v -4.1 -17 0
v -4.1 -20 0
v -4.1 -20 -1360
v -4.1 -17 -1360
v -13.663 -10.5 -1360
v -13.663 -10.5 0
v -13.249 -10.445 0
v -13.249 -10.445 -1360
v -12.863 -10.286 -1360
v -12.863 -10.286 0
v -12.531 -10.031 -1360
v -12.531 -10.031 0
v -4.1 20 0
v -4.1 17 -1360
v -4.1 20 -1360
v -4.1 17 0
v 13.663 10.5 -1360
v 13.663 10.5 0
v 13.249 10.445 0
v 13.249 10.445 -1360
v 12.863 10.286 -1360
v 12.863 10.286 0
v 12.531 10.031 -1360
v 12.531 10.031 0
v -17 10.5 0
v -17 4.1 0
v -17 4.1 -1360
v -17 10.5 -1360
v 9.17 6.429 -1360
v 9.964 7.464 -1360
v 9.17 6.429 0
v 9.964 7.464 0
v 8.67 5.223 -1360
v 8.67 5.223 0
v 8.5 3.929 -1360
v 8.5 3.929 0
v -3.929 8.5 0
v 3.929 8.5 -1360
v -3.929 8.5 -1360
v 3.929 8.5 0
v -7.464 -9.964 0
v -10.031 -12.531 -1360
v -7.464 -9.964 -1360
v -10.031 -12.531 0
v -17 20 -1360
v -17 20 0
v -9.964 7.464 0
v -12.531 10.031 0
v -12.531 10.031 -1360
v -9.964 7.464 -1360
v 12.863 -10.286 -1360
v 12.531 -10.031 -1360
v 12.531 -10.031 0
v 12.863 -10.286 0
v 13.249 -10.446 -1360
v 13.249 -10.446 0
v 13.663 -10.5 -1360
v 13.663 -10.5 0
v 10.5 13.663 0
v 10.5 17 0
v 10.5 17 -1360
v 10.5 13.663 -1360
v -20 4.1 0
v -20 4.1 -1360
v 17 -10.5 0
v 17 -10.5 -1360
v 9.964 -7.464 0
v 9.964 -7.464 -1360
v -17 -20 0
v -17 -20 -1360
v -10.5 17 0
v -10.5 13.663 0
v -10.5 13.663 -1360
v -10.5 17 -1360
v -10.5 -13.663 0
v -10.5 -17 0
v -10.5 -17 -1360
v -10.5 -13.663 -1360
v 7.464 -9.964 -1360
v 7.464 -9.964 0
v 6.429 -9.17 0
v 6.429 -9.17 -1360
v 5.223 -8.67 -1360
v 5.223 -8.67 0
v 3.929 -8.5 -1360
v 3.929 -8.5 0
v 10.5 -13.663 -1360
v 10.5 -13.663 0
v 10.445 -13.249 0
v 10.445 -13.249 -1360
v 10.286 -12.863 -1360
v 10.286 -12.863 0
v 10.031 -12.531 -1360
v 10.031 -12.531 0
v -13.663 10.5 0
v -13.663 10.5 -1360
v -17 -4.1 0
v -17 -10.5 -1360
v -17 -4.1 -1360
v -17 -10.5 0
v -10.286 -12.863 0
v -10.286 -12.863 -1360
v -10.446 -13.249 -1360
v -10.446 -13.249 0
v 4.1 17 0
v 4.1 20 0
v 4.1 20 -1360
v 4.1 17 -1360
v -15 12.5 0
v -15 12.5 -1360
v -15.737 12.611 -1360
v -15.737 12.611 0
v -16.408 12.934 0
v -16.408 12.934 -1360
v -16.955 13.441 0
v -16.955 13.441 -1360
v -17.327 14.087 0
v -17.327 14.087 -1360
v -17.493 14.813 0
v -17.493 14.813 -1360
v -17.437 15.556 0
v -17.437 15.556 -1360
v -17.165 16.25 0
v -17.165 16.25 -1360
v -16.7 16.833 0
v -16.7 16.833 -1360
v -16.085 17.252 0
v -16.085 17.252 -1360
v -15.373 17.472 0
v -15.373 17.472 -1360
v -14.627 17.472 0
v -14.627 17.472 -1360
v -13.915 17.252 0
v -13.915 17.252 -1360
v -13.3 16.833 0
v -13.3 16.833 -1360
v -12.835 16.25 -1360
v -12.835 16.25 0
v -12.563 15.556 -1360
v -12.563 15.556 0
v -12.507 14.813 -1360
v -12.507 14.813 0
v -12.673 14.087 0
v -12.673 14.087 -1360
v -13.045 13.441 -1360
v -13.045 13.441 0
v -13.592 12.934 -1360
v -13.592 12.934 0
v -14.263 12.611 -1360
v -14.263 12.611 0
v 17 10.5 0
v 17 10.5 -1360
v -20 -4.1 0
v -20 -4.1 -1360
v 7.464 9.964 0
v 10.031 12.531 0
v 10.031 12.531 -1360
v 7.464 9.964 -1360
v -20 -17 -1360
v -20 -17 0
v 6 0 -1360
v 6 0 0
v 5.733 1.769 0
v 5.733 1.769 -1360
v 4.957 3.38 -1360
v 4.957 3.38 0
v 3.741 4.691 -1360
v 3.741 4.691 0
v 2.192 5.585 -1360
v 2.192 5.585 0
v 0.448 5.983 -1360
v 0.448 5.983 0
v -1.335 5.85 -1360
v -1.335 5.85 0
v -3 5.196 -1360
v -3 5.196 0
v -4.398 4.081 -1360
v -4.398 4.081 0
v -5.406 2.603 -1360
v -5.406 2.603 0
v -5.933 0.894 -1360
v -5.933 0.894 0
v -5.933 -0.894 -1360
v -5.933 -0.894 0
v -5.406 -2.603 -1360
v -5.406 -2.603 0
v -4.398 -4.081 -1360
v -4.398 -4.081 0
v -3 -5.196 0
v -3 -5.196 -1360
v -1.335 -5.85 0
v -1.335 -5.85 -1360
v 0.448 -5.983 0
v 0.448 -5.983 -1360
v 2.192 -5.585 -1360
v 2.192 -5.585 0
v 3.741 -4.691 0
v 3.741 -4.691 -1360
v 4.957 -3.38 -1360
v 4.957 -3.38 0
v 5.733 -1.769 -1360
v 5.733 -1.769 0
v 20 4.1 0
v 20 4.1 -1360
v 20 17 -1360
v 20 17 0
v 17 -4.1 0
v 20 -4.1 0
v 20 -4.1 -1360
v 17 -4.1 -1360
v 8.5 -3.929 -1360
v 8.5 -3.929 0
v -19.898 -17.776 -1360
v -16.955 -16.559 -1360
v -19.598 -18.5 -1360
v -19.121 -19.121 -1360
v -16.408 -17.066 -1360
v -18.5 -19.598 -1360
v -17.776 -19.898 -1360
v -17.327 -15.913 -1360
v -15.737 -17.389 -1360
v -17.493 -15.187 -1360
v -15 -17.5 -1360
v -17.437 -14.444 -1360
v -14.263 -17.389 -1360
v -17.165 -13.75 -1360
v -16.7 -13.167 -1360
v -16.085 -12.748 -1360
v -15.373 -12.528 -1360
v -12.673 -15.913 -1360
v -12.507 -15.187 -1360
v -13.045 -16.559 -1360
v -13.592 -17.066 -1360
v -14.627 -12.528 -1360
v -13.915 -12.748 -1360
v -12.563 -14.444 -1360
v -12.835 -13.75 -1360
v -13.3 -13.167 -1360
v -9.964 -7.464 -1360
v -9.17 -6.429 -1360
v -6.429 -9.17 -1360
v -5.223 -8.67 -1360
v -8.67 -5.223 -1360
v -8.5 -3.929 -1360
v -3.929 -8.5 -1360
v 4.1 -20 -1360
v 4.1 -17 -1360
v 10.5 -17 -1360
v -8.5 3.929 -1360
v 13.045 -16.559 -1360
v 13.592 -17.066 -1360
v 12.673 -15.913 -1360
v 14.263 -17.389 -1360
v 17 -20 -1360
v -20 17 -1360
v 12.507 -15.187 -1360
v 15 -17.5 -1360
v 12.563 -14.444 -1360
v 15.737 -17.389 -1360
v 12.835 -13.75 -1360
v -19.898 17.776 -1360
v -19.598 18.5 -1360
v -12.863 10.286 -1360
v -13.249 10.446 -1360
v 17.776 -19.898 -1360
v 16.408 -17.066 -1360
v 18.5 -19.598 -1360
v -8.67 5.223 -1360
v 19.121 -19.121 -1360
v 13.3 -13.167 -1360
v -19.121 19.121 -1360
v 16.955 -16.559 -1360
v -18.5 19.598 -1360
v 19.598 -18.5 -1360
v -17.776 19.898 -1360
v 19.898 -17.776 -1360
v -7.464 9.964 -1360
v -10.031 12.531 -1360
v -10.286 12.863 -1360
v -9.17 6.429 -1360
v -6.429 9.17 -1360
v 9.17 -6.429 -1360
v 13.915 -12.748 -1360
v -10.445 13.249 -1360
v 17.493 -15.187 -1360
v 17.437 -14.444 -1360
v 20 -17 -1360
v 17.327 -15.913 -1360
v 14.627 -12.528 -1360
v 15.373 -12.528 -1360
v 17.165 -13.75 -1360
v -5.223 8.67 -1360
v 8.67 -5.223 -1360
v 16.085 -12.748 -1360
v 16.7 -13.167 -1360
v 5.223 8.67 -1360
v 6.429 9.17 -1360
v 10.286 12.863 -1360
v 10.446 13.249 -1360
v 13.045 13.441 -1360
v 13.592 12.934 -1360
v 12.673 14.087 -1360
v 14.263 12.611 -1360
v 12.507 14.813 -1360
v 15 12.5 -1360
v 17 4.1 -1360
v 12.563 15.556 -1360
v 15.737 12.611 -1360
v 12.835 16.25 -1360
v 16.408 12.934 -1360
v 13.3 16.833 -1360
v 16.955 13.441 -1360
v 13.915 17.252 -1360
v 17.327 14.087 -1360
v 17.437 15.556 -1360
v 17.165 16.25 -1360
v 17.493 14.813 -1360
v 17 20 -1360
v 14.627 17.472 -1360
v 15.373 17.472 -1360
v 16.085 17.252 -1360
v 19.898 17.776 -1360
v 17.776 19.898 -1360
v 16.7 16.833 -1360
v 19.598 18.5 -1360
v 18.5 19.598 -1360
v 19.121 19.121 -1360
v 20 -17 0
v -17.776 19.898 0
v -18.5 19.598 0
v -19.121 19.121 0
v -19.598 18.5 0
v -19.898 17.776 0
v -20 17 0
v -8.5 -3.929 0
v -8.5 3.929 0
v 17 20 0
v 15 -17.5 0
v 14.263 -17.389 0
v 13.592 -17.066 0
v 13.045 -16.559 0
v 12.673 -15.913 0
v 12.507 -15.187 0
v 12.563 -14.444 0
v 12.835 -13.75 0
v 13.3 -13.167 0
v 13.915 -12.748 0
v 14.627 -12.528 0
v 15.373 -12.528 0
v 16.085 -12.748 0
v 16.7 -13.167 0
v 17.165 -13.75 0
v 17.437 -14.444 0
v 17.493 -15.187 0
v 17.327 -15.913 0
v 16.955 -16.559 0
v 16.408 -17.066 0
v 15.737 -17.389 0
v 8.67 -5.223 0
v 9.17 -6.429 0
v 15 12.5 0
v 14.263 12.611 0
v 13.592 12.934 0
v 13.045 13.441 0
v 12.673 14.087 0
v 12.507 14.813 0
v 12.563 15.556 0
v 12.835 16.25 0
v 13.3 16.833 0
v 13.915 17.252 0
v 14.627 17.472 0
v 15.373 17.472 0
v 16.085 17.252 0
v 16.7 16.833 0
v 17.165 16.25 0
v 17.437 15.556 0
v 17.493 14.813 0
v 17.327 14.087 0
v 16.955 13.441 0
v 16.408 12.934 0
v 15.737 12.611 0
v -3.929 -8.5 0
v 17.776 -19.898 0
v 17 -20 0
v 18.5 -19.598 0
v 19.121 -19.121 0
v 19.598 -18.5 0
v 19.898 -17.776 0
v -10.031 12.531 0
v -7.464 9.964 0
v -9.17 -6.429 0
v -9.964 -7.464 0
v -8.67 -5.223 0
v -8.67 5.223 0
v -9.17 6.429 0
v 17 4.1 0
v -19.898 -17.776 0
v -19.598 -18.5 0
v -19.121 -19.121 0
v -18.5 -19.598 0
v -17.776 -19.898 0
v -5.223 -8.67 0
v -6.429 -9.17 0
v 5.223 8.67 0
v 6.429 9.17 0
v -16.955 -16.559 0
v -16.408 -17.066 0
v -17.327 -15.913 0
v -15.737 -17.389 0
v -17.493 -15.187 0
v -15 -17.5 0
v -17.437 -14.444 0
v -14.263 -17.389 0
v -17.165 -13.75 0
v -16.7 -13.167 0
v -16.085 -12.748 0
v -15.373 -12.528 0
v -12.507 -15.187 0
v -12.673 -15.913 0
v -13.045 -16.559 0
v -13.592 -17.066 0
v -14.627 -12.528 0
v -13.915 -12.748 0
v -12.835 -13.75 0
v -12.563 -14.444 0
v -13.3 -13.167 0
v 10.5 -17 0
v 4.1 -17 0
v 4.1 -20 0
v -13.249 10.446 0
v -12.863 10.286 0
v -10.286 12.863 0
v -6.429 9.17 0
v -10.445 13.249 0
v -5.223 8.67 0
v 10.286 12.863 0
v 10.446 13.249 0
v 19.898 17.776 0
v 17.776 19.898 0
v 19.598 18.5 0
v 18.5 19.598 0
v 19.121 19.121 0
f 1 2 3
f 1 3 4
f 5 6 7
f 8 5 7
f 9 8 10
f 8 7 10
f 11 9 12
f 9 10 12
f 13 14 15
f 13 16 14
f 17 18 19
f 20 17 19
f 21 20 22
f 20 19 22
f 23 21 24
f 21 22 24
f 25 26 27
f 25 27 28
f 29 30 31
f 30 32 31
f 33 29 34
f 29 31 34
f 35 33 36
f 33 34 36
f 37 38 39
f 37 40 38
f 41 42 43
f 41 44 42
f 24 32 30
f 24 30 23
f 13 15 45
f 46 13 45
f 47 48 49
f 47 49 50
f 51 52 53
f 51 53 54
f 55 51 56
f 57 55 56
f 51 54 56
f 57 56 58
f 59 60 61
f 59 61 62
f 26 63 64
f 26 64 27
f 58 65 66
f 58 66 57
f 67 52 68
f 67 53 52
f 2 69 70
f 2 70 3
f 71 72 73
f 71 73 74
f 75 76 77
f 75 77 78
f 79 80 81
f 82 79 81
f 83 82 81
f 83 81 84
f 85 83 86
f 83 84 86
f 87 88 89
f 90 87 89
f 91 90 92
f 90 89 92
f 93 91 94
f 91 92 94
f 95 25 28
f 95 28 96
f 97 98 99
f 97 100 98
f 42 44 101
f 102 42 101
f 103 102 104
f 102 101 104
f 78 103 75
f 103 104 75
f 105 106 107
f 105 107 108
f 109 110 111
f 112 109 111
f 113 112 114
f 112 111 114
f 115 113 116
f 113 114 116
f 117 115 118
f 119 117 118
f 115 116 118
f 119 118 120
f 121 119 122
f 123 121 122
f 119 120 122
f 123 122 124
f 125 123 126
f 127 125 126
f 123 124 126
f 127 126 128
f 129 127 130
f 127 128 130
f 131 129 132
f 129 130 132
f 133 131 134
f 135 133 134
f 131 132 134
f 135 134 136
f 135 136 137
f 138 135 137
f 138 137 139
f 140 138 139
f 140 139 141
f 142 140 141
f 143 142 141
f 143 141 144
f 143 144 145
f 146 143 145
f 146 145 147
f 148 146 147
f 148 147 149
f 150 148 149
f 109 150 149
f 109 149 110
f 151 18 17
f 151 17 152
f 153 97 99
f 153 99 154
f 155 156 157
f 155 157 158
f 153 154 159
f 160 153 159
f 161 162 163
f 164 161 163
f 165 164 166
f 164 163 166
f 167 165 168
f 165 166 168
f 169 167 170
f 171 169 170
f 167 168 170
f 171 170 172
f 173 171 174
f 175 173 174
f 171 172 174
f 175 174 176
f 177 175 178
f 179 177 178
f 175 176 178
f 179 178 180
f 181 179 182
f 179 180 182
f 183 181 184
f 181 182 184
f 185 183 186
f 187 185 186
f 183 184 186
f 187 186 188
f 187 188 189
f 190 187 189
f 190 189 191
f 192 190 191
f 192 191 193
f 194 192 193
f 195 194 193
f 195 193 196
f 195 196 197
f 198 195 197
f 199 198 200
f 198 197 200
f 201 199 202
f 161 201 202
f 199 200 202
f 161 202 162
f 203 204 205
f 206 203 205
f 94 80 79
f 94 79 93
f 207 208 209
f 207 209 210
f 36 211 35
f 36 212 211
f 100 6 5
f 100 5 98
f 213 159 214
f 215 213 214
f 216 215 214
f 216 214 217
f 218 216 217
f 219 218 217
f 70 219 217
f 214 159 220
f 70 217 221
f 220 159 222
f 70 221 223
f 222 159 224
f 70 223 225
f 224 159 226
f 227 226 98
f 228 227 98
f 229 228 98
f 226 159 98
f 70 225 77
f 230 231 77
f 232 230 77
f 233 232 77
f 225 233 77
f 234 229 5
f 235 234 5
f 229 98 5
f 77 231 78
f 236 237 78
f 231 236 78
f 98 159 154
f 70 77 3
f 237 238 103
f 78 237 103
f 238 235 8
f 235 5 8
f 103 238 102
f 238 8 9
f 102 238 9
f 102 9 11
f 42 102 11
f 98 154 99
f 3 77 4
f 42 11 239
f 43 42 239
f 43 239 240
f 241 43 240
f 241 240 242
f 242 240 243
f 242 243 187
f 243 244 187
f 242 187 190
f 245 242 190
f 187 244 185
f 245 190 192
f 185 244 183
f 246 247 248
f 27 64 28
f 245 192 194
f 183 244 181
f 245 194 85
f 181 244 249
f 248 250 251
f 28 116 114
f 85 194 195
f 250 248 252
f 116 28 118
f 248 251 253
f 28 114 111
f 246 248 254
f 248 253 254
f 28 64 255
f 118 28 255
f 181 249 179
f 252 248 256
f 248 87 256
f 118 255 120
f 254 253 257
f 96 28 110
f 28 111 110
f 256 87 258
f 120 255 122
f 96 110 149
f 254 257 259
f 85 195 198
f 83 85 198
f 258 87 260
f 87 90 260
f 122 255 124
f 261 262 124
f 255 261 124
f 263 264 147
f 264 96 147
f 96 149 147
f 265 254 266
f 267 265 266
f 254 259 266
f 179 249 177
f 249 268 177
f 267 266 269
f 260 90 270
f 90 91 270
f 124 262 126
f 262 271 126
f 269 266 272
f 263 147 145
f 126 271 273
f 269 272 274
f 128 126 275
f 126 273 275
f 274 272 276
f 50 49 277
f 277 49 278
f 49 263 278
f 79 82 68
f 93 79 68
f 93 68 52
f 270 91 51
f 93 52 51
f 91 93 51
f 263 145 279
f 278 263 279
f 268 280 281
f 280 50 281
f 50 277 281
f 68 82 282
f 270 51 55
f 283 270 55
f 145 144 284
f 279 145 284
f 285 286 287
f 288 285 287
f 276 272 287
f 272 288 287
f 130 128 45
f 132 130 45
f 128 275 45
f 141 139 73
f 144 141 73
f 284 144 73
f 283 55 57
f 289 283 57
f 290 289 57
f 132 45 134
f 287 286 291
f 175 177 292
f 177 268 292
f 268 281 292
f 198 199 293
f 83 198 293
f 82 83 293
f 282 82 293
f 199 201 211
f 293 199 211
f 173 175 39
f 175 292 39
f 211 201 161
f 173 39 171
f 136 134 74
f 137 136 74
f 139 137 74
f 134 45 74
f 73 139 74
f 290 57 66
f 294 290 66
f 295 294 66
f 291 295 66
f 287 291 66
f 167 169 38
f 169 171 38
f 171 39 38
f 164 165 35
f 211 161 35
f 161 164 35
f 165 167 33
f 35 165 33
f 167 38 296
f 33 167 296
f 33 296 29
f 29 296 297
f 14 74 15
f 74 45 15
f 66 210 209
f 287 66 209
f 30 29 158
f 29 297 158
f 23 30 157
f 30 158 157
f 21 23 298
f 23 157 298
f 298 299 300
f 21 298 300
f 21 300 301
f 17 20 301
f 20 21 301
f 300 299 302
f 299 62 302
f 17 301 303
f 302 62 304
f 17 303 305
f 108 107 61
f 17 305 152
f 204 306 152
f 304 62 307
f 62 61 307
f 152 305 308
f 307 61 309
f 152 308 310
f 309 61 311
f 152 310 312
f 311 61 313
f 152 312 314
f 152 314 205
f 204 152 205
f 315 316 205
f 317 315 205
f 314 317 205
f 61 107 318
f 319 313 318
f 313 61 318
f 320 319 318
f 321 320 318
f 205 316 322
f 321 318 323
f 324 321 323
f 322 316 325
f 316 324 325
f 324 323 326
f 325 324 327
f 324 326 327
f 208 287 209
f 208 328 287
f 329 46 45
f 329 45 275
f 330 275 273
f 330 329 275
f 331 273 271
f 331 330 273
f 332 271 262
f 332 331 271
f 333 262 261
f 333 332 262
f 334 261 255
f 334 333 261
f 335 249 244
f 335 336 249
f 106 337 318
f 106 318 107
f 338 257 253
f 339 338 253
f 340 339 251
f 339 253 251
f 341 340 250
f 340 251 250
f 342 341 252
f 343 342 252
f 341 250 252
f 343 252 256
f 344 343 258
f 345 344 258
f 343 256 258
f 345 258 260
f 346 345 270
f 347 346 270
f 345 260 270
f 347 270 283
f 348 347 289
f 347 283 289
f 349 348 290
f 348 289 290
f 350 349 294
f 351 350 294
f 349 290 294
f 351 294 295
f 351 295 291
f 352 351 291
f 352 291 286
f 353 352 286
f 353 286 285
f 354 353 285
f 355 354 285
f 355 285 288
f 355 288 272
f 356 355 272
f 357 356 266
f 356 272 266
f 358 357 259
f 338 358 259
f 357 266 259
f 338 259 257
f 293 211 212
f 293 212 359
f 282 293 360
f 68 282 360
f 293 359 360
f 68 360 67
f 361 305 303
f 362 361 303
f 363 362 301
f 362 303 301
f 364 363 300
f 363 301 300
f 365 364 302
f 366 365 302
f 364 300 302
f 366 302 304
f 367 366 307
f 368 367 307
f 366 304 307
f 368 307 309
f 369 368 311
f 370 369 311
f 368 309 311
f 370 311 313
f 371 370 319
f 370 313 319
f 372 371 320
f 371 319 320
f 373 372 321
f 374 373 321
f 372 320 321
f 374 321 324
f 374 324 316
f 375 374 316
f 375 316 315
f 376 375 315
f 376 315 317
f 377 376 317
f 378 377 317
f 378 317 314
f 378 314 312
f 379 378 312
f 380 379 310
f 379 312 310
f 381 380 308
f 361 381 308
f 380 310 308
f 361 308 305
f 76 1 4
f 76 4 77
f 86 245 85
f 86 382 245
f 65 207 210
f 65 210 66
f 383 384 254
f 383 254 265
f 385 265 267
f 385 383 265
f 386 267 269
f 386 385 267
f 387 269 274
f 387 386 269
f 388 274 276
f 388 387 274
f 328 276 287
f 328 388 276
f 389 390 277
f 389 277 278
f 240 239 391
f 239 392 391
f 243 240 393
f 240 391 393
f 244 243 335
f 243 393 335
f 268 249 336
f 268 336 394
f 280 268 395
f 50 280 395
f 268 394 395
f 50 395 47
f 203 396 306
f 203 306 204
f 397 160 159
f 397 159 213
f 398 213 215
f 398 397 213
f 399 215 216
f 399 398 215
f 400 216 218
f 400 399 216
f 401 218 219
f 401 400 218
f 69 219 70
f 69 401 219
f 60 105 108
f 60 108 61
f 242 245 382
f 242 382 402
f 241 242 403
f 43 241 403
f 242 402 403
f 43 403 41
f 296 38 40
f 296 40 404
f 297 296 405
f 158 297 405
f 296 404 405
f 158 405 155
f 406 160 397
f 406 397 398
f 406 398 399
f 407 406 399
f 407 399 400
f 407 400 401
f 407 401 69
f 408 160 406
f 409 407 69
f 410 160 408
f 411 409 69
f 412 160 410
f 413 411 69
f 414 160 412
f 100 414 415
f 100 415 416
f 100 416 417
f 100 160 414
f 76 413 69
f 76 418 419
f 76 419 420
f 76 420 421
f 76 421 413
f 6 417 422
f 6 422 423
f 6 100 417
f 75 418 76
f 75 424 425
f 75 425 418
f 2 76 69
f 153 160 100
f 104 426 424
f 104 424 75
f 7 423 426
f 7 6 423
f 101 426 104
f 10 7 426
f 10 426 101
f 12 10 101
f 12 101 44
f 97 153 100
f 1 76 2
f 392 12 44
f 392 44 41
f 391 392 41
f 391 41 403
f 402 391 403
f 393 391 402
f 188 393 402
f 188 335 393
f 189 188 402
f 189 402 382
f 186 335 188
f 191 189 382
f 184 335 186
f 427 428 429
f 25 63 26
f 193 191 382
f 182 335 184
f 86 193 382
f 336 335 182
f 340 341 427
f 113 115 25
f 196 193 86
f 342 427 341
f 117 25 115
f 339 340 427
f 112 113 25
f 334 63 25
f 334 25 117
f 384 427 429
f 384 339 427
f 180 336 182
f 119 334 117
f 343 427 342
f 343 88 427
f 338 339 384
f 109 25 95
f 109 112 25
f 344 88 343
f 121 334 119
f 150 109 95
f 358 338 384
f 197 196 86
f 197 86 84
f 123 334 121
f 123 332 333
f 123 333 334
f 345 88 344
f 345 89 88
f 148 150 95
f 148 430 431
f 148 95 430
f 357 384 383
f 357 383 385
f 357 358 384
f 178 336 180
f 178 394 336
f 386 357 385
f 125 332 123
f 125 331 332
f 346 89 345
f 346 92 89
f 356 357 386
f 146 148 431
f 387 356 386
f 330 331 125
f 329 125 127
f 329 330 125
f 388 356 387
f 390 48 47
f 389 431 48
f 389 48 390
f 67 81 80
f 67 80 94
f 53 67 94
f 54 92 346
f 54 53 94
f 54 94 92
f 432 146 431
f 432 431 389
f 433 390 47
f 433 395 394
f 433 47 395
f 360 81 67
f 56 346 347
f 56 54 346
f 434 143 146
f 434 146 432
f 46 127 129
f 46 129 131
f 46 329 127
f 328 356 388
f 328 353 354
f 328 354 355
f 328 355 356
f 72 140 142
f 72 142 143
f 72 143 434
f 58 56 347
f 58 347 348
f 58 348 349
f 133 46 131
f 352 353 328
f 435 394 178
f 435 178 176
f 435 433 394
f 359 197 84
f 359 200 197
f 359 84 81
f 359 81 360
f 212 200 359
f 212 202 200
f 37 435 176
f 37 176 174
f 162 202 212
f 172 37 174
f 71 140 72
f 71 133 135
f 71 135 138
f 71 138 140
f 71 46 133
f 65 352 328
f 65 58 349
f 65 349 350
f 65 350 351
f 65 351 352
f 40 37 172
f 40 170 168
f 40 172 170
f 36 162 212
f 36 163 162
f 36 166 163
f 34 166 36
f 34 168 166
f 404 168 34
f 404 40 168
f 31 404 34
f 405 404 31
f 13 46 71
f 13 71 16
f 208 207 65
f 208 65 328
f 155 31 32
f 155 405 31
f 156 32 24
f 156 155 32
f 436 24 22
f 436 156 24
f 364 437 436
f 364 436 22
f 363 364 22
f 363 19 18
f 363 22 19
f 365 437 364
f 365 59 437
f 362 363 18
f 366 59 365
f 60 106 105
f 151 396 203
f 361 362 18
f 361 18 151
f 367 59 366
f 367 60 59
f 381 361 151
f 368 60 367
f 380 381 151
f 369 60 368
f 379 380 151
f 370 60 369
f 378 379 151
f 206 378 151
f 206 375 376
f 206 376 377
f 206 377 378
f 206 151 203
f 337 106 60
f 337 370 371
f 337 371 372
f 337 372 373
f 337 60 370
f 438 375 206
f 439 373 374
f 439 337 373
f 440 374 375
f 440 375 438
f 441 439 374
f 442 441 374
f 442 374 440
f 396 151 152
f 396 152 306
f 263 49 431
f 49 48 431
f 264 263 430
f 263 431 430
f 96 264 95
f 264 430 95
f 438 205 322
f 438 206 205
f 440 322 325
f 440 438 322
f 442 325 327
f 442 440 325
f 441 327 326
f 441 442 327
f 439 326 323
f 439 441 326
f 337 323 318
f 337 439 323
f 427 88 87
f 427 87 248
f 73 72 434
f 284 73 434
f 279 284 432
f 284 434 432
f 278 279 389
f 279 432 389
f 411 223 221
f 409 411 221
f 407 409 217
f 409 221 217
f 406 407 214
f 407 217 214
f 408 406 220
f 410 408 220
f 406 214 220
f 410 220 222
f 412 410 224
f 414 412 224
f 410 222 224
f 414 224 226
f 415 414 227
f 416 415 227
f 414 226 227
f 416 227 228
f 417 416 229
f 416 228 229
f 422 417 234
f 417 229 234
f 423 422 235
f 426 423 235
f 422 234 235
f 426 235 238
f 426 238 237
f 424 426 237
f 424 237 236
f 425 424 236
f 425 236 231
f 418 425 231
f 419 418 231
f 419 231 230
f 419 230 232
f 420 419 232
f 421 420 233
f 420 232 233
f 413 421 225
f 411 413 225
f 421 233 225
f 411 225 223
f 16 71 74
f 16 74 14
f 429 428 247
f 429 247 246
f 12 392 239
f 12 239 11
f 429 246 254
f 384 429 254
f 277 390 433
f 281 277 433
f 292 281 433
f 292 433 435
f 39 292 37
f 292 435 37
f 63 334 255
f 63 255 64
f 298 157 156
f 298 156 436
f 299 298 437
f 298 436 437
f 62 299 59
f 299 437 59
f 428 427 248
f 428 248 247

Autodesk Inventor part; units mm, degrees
sketch "Skizze_1" plane through (0, 0, 0) normal (0, 0, 1) x (1, 0, 0)
  arc A0 (-20, -17) -> (-17, -20) centre (-17, -17) ccw
  line L0 (-17, -20) -> (-4.1, -20)
  line L1 (-4.1, -20) -> (-4.1, -17)
  line L2 (-4.1, -17) -> (-10.5, -17)
  line L3 (-10.5, -17) -> (-10.5, -13.6627)
  arc A1 (-10.0314, -12.5314) -> (-10.5, -13.6627) centre (-8.9002, -13.6627) ccw
  line L4 (-10.0314, -12.5314) -> (-7.4645, -9.9645)
  arc A2 (-3.9289, -8.5) -> (-7.4645, -9.9645) centre (-3.9289, -13.5) ccw
  line L5 (-3.9289, -8.5) -> (3.9289, -8.5)
  arc A3 (7.4645, -9.9645) -> (3.9289, -8.5) centre (3.9289, -13.5) ccw
  line L6 (7.4645, -9.9645) -> (10.0314, -12.5314)
  arc A4 (10.5, -13.6627) -> (10.0314, -12.5314) centre (8.9002, -13.6627) ccw
  line L7 (10.5, -13.6627) -> (10.5, -17)
  line L8 (10.5, -17) -> (4.1, -17)
  line L9 (4.1, -17) -> (4.1, -20)
  line L10 (4.1, -20) -> (17, -20)
  arc A5 (17, -20) -> (20, -17) centre (17, -17) ccw
  line L11 (20, -17) -> (20, -4.1)
  line L12 (20, -4.1) -> (17, -4.1)
  line L13 (17, -4.1) -> (17, -10.5)
  line L14 (17, -10.5) -> (13.6627, -10.5)
  arc A6 (12.5314, -10.0314) -> (13.6627, -10.5) centre (13.6627, -8.9002) ccw
  line L15 (12.5314, -10.0314) -> (9.9645, -7.4645)
  arc A7 (8.5, -3.9289) -> (9.9645, -7.4645) centre (13.5, -3.9289) ccw
  line L16 (8.5, -3.9289) -> (8.5, 3.9289)
  arc A8 (9.9645, 7.4645) -> (8.5, 3.9289) centre (13.5, 3.9289) ccw
  line L17 (9.9645, 7.4645) -> (12.5314, 10.0314)
  arc A9 (13.6627, 10.5) -> (12.5314, 10.0314) centre (13.6627, 8.9002) ccw
  line L18 (13.6627, 10.5) -> (17, 10.5)
  line L19 (17, 10.5) -> (17, 4.1)
  line L20 (17, 4.1) -> (20, 4.1)
  line L21 (20, 4.1) -> (20, 17)
  arc A10 (20, 17) -> (17, 20) centre (17, 17) ccw
  line L22 (17, 20) -> (4.1, 20)
  line L23 (4.1, 20) -> (4.1, 17)
  line L24 (4.1, 17) -> (10.5, 17)
  line L25 (10.5, 17) -> (10.5, 13.6627)
  arc A11 (10.0314, 12.5314) -> (10.5, 13.6627) centre (8.9002, 13.6627) ccw
  line L26 (10.0314, 12.5314) -> (7.4645, 9.9645)
  arc A12 (3.9289, 8.5) -> (7.4645, 9.9645) centre (3.9289, 13.5) ccw
  line L27 (3.9289, 8.5) -> (-3.9289, 8.5)
  arc A13 (-7.4645, 9.9645) -> (-3.9289, 8.5) centre (-3.9289, 13.5) ccw
  line L28 (-7.4645, 9.9645) -> (-10.0314, 12.5314)
  arc A14 (-10.5, 13.6627) -> (-10.0314, 12.5314) centre (-8.9002, 13.6627) ccw
  line L29 (-10.5, 13.6627) -> (-10.5, 17)
  line L30 (-10.5, 17) -> (-4.1, 17)
  line L31 (-4.1, 17) -> (-4.1, 20)
  line L32 (-4.1, 20) -> (-17, 20)
  arc A15 (-17, 20) -> (-20, 17) centre (-17, 17) ccw
  line L33 (-20, 17) -> (-20, 4.1)
  line L34 (-20, 4.1) -> (-17, 4.1)
  line L35 (-17, 4.1) -> (-17, 10.5)
  line L36 (-17, 10.5) -> (-13.6627, 10.5)
  arc A16 (-12.5314, 10.0314) -> (-13.6627, 10.5) centre (-13.6627, 8.9002) ccw
  line L37 (-12.5314, 10.0314) -> (-9.9645, 7.4645)
  arc A17 (-8.5, 3.9289) -> (-9.9645, 7.4645) centre (-13.5, 3.9289) ccw
  line L38 (-8.5, 3.9289) -> (-8.5, -3.9289)
  arc A18 (-9.9645, -7.4645) -> (-8.5, -3.9289) centre (-13.5, -3.9289) ccw
  line L39 (-9.9645, -7.4645) -> (-12.5314, -10.0314)
  arc A19 (-13.6627, -10.5) -> (-12.5314, -10.0314) centre (-13.6627, -8.9002) ccw
  line L40 (-13.6627, -10.5) -> (-17, -10.5)
  line L41 (-17, -10.5) -> (-17, -4.1)
  line L42 (-17, -4.1) -> (-20, -4.1)
  line L43 (-20, -4.1) -> (-20, -17)
  circle A20 centre (0, 0) radius 6
extrude "Extrusion1" add sketch "Skizze_1" against normal blind 1360
sketch "Sketch2" plane through (0, 0, 0) normal (0, 0, 1) x (1, 0, 0)
  point P0 (-15, -15)
hole "Drilling 1" at (-15, -15, 0) direction (0, 0, -1) diameter 5 depth 6000
sketch "Sketch3" plane through (0, 0, 0) normal (0, 0, 1) x (1, 0, 0)
  point P0 (15, -15)
hole "Drilling 2" at (15, -15, 0) direction (0, 0, -1) diameter 5 depth 6000
sketch "Sketch4" plane through (0, 0, 0) normal (0, 0, 1) x (1, 0, 0)
  point P0 (15, 15)
hole "Drilling 3" at (15, 15, 0) direction (0, 0, -1) diameter 5 depth 6000
sketch "Sketch5" plane through (0, 0, 0) normal (0, 0, 1) x (1, 0, 0)
  point P0 (-15, 15)
hole "Drilling 4" at (-15, 15, 0) direction (0, 0, -1) diameter 5 depth 6000
ref_plane "side_4d_XY" through (-20, 0, -680) normal (-1, 0, 0) x (0, 1, 0)
ref_plane "side_4d_YZ" through (-20, 0, -680) normal (0, 1, 0) x (0, 0, -1)
ref_plane "side_4d_ZX" through (-20, 0, -680) normal (0, 0, -1) x (-1, 0, 0)
ref_plane "side_1a_XY" through (0, 20, -680) normal (0, 1, 0) x (1, 0, 0)
ref_plane "side_1a_YZ" through (0, 20, -680) normal (1, 0, 0) x (0, 0, -1)
ref_plane "side_1a_ZX" through (0, 20, -680) normal (0, 0, -1) x (0, 1, 0)
ref_plane "side_2b_XY" through (20, 0, -680) normal (1, 0, 0) x (0, -1, 0)
ref_plane "side_2b_YZ" through (20, 0, -680) normal (0, -1, 0) x (0, 0, -1)
ref_plane "side_2b_ZX" through (20, 0, -680) normal (0, 0, -1) x (1, 0, 0)
ref_plane "side_3c_XY" through (0, -20, -680) normal (0, -1, 0) x (-1, 0, 0)
ref_plane "side_3c_YZ" through (0, -20, -680) normal (-1, 0, 0) x (0, 0, -1)
ref_plane "side_3c_ZX" through (0, -20, -680) normal (0, 0, -1) x (0, -1, 0)
ref_plane "end_XY" through (0, 0, -1360) normal (0, 0, -1) x (1, 0, 0)
ref_plane "end_YZ" through (0, 0, -1360) normal (1, 0, 0) x (0, -1, 0)
ref_plane "end_ZX" through (0, 0, -1360) normal (0, -1, 0) x (0, 0, -1)
ref_plane "start_XY" through (0, 0, 0) normal (0, 0, 1) x (1, 0, 0)
ref_plane "start_YZ" through (0, 0, 0) normal (1, 0, 0) x (0, 1, 0)
ref_plane "start_ZX" through (0, 0, 0) normal (0, 1, 0) x (0, 0, 1)
properties part number "MayTec 1.11.040040.43S_Profile 40x40, 4E, S_1360_Detail_(0;0,0,0)"
